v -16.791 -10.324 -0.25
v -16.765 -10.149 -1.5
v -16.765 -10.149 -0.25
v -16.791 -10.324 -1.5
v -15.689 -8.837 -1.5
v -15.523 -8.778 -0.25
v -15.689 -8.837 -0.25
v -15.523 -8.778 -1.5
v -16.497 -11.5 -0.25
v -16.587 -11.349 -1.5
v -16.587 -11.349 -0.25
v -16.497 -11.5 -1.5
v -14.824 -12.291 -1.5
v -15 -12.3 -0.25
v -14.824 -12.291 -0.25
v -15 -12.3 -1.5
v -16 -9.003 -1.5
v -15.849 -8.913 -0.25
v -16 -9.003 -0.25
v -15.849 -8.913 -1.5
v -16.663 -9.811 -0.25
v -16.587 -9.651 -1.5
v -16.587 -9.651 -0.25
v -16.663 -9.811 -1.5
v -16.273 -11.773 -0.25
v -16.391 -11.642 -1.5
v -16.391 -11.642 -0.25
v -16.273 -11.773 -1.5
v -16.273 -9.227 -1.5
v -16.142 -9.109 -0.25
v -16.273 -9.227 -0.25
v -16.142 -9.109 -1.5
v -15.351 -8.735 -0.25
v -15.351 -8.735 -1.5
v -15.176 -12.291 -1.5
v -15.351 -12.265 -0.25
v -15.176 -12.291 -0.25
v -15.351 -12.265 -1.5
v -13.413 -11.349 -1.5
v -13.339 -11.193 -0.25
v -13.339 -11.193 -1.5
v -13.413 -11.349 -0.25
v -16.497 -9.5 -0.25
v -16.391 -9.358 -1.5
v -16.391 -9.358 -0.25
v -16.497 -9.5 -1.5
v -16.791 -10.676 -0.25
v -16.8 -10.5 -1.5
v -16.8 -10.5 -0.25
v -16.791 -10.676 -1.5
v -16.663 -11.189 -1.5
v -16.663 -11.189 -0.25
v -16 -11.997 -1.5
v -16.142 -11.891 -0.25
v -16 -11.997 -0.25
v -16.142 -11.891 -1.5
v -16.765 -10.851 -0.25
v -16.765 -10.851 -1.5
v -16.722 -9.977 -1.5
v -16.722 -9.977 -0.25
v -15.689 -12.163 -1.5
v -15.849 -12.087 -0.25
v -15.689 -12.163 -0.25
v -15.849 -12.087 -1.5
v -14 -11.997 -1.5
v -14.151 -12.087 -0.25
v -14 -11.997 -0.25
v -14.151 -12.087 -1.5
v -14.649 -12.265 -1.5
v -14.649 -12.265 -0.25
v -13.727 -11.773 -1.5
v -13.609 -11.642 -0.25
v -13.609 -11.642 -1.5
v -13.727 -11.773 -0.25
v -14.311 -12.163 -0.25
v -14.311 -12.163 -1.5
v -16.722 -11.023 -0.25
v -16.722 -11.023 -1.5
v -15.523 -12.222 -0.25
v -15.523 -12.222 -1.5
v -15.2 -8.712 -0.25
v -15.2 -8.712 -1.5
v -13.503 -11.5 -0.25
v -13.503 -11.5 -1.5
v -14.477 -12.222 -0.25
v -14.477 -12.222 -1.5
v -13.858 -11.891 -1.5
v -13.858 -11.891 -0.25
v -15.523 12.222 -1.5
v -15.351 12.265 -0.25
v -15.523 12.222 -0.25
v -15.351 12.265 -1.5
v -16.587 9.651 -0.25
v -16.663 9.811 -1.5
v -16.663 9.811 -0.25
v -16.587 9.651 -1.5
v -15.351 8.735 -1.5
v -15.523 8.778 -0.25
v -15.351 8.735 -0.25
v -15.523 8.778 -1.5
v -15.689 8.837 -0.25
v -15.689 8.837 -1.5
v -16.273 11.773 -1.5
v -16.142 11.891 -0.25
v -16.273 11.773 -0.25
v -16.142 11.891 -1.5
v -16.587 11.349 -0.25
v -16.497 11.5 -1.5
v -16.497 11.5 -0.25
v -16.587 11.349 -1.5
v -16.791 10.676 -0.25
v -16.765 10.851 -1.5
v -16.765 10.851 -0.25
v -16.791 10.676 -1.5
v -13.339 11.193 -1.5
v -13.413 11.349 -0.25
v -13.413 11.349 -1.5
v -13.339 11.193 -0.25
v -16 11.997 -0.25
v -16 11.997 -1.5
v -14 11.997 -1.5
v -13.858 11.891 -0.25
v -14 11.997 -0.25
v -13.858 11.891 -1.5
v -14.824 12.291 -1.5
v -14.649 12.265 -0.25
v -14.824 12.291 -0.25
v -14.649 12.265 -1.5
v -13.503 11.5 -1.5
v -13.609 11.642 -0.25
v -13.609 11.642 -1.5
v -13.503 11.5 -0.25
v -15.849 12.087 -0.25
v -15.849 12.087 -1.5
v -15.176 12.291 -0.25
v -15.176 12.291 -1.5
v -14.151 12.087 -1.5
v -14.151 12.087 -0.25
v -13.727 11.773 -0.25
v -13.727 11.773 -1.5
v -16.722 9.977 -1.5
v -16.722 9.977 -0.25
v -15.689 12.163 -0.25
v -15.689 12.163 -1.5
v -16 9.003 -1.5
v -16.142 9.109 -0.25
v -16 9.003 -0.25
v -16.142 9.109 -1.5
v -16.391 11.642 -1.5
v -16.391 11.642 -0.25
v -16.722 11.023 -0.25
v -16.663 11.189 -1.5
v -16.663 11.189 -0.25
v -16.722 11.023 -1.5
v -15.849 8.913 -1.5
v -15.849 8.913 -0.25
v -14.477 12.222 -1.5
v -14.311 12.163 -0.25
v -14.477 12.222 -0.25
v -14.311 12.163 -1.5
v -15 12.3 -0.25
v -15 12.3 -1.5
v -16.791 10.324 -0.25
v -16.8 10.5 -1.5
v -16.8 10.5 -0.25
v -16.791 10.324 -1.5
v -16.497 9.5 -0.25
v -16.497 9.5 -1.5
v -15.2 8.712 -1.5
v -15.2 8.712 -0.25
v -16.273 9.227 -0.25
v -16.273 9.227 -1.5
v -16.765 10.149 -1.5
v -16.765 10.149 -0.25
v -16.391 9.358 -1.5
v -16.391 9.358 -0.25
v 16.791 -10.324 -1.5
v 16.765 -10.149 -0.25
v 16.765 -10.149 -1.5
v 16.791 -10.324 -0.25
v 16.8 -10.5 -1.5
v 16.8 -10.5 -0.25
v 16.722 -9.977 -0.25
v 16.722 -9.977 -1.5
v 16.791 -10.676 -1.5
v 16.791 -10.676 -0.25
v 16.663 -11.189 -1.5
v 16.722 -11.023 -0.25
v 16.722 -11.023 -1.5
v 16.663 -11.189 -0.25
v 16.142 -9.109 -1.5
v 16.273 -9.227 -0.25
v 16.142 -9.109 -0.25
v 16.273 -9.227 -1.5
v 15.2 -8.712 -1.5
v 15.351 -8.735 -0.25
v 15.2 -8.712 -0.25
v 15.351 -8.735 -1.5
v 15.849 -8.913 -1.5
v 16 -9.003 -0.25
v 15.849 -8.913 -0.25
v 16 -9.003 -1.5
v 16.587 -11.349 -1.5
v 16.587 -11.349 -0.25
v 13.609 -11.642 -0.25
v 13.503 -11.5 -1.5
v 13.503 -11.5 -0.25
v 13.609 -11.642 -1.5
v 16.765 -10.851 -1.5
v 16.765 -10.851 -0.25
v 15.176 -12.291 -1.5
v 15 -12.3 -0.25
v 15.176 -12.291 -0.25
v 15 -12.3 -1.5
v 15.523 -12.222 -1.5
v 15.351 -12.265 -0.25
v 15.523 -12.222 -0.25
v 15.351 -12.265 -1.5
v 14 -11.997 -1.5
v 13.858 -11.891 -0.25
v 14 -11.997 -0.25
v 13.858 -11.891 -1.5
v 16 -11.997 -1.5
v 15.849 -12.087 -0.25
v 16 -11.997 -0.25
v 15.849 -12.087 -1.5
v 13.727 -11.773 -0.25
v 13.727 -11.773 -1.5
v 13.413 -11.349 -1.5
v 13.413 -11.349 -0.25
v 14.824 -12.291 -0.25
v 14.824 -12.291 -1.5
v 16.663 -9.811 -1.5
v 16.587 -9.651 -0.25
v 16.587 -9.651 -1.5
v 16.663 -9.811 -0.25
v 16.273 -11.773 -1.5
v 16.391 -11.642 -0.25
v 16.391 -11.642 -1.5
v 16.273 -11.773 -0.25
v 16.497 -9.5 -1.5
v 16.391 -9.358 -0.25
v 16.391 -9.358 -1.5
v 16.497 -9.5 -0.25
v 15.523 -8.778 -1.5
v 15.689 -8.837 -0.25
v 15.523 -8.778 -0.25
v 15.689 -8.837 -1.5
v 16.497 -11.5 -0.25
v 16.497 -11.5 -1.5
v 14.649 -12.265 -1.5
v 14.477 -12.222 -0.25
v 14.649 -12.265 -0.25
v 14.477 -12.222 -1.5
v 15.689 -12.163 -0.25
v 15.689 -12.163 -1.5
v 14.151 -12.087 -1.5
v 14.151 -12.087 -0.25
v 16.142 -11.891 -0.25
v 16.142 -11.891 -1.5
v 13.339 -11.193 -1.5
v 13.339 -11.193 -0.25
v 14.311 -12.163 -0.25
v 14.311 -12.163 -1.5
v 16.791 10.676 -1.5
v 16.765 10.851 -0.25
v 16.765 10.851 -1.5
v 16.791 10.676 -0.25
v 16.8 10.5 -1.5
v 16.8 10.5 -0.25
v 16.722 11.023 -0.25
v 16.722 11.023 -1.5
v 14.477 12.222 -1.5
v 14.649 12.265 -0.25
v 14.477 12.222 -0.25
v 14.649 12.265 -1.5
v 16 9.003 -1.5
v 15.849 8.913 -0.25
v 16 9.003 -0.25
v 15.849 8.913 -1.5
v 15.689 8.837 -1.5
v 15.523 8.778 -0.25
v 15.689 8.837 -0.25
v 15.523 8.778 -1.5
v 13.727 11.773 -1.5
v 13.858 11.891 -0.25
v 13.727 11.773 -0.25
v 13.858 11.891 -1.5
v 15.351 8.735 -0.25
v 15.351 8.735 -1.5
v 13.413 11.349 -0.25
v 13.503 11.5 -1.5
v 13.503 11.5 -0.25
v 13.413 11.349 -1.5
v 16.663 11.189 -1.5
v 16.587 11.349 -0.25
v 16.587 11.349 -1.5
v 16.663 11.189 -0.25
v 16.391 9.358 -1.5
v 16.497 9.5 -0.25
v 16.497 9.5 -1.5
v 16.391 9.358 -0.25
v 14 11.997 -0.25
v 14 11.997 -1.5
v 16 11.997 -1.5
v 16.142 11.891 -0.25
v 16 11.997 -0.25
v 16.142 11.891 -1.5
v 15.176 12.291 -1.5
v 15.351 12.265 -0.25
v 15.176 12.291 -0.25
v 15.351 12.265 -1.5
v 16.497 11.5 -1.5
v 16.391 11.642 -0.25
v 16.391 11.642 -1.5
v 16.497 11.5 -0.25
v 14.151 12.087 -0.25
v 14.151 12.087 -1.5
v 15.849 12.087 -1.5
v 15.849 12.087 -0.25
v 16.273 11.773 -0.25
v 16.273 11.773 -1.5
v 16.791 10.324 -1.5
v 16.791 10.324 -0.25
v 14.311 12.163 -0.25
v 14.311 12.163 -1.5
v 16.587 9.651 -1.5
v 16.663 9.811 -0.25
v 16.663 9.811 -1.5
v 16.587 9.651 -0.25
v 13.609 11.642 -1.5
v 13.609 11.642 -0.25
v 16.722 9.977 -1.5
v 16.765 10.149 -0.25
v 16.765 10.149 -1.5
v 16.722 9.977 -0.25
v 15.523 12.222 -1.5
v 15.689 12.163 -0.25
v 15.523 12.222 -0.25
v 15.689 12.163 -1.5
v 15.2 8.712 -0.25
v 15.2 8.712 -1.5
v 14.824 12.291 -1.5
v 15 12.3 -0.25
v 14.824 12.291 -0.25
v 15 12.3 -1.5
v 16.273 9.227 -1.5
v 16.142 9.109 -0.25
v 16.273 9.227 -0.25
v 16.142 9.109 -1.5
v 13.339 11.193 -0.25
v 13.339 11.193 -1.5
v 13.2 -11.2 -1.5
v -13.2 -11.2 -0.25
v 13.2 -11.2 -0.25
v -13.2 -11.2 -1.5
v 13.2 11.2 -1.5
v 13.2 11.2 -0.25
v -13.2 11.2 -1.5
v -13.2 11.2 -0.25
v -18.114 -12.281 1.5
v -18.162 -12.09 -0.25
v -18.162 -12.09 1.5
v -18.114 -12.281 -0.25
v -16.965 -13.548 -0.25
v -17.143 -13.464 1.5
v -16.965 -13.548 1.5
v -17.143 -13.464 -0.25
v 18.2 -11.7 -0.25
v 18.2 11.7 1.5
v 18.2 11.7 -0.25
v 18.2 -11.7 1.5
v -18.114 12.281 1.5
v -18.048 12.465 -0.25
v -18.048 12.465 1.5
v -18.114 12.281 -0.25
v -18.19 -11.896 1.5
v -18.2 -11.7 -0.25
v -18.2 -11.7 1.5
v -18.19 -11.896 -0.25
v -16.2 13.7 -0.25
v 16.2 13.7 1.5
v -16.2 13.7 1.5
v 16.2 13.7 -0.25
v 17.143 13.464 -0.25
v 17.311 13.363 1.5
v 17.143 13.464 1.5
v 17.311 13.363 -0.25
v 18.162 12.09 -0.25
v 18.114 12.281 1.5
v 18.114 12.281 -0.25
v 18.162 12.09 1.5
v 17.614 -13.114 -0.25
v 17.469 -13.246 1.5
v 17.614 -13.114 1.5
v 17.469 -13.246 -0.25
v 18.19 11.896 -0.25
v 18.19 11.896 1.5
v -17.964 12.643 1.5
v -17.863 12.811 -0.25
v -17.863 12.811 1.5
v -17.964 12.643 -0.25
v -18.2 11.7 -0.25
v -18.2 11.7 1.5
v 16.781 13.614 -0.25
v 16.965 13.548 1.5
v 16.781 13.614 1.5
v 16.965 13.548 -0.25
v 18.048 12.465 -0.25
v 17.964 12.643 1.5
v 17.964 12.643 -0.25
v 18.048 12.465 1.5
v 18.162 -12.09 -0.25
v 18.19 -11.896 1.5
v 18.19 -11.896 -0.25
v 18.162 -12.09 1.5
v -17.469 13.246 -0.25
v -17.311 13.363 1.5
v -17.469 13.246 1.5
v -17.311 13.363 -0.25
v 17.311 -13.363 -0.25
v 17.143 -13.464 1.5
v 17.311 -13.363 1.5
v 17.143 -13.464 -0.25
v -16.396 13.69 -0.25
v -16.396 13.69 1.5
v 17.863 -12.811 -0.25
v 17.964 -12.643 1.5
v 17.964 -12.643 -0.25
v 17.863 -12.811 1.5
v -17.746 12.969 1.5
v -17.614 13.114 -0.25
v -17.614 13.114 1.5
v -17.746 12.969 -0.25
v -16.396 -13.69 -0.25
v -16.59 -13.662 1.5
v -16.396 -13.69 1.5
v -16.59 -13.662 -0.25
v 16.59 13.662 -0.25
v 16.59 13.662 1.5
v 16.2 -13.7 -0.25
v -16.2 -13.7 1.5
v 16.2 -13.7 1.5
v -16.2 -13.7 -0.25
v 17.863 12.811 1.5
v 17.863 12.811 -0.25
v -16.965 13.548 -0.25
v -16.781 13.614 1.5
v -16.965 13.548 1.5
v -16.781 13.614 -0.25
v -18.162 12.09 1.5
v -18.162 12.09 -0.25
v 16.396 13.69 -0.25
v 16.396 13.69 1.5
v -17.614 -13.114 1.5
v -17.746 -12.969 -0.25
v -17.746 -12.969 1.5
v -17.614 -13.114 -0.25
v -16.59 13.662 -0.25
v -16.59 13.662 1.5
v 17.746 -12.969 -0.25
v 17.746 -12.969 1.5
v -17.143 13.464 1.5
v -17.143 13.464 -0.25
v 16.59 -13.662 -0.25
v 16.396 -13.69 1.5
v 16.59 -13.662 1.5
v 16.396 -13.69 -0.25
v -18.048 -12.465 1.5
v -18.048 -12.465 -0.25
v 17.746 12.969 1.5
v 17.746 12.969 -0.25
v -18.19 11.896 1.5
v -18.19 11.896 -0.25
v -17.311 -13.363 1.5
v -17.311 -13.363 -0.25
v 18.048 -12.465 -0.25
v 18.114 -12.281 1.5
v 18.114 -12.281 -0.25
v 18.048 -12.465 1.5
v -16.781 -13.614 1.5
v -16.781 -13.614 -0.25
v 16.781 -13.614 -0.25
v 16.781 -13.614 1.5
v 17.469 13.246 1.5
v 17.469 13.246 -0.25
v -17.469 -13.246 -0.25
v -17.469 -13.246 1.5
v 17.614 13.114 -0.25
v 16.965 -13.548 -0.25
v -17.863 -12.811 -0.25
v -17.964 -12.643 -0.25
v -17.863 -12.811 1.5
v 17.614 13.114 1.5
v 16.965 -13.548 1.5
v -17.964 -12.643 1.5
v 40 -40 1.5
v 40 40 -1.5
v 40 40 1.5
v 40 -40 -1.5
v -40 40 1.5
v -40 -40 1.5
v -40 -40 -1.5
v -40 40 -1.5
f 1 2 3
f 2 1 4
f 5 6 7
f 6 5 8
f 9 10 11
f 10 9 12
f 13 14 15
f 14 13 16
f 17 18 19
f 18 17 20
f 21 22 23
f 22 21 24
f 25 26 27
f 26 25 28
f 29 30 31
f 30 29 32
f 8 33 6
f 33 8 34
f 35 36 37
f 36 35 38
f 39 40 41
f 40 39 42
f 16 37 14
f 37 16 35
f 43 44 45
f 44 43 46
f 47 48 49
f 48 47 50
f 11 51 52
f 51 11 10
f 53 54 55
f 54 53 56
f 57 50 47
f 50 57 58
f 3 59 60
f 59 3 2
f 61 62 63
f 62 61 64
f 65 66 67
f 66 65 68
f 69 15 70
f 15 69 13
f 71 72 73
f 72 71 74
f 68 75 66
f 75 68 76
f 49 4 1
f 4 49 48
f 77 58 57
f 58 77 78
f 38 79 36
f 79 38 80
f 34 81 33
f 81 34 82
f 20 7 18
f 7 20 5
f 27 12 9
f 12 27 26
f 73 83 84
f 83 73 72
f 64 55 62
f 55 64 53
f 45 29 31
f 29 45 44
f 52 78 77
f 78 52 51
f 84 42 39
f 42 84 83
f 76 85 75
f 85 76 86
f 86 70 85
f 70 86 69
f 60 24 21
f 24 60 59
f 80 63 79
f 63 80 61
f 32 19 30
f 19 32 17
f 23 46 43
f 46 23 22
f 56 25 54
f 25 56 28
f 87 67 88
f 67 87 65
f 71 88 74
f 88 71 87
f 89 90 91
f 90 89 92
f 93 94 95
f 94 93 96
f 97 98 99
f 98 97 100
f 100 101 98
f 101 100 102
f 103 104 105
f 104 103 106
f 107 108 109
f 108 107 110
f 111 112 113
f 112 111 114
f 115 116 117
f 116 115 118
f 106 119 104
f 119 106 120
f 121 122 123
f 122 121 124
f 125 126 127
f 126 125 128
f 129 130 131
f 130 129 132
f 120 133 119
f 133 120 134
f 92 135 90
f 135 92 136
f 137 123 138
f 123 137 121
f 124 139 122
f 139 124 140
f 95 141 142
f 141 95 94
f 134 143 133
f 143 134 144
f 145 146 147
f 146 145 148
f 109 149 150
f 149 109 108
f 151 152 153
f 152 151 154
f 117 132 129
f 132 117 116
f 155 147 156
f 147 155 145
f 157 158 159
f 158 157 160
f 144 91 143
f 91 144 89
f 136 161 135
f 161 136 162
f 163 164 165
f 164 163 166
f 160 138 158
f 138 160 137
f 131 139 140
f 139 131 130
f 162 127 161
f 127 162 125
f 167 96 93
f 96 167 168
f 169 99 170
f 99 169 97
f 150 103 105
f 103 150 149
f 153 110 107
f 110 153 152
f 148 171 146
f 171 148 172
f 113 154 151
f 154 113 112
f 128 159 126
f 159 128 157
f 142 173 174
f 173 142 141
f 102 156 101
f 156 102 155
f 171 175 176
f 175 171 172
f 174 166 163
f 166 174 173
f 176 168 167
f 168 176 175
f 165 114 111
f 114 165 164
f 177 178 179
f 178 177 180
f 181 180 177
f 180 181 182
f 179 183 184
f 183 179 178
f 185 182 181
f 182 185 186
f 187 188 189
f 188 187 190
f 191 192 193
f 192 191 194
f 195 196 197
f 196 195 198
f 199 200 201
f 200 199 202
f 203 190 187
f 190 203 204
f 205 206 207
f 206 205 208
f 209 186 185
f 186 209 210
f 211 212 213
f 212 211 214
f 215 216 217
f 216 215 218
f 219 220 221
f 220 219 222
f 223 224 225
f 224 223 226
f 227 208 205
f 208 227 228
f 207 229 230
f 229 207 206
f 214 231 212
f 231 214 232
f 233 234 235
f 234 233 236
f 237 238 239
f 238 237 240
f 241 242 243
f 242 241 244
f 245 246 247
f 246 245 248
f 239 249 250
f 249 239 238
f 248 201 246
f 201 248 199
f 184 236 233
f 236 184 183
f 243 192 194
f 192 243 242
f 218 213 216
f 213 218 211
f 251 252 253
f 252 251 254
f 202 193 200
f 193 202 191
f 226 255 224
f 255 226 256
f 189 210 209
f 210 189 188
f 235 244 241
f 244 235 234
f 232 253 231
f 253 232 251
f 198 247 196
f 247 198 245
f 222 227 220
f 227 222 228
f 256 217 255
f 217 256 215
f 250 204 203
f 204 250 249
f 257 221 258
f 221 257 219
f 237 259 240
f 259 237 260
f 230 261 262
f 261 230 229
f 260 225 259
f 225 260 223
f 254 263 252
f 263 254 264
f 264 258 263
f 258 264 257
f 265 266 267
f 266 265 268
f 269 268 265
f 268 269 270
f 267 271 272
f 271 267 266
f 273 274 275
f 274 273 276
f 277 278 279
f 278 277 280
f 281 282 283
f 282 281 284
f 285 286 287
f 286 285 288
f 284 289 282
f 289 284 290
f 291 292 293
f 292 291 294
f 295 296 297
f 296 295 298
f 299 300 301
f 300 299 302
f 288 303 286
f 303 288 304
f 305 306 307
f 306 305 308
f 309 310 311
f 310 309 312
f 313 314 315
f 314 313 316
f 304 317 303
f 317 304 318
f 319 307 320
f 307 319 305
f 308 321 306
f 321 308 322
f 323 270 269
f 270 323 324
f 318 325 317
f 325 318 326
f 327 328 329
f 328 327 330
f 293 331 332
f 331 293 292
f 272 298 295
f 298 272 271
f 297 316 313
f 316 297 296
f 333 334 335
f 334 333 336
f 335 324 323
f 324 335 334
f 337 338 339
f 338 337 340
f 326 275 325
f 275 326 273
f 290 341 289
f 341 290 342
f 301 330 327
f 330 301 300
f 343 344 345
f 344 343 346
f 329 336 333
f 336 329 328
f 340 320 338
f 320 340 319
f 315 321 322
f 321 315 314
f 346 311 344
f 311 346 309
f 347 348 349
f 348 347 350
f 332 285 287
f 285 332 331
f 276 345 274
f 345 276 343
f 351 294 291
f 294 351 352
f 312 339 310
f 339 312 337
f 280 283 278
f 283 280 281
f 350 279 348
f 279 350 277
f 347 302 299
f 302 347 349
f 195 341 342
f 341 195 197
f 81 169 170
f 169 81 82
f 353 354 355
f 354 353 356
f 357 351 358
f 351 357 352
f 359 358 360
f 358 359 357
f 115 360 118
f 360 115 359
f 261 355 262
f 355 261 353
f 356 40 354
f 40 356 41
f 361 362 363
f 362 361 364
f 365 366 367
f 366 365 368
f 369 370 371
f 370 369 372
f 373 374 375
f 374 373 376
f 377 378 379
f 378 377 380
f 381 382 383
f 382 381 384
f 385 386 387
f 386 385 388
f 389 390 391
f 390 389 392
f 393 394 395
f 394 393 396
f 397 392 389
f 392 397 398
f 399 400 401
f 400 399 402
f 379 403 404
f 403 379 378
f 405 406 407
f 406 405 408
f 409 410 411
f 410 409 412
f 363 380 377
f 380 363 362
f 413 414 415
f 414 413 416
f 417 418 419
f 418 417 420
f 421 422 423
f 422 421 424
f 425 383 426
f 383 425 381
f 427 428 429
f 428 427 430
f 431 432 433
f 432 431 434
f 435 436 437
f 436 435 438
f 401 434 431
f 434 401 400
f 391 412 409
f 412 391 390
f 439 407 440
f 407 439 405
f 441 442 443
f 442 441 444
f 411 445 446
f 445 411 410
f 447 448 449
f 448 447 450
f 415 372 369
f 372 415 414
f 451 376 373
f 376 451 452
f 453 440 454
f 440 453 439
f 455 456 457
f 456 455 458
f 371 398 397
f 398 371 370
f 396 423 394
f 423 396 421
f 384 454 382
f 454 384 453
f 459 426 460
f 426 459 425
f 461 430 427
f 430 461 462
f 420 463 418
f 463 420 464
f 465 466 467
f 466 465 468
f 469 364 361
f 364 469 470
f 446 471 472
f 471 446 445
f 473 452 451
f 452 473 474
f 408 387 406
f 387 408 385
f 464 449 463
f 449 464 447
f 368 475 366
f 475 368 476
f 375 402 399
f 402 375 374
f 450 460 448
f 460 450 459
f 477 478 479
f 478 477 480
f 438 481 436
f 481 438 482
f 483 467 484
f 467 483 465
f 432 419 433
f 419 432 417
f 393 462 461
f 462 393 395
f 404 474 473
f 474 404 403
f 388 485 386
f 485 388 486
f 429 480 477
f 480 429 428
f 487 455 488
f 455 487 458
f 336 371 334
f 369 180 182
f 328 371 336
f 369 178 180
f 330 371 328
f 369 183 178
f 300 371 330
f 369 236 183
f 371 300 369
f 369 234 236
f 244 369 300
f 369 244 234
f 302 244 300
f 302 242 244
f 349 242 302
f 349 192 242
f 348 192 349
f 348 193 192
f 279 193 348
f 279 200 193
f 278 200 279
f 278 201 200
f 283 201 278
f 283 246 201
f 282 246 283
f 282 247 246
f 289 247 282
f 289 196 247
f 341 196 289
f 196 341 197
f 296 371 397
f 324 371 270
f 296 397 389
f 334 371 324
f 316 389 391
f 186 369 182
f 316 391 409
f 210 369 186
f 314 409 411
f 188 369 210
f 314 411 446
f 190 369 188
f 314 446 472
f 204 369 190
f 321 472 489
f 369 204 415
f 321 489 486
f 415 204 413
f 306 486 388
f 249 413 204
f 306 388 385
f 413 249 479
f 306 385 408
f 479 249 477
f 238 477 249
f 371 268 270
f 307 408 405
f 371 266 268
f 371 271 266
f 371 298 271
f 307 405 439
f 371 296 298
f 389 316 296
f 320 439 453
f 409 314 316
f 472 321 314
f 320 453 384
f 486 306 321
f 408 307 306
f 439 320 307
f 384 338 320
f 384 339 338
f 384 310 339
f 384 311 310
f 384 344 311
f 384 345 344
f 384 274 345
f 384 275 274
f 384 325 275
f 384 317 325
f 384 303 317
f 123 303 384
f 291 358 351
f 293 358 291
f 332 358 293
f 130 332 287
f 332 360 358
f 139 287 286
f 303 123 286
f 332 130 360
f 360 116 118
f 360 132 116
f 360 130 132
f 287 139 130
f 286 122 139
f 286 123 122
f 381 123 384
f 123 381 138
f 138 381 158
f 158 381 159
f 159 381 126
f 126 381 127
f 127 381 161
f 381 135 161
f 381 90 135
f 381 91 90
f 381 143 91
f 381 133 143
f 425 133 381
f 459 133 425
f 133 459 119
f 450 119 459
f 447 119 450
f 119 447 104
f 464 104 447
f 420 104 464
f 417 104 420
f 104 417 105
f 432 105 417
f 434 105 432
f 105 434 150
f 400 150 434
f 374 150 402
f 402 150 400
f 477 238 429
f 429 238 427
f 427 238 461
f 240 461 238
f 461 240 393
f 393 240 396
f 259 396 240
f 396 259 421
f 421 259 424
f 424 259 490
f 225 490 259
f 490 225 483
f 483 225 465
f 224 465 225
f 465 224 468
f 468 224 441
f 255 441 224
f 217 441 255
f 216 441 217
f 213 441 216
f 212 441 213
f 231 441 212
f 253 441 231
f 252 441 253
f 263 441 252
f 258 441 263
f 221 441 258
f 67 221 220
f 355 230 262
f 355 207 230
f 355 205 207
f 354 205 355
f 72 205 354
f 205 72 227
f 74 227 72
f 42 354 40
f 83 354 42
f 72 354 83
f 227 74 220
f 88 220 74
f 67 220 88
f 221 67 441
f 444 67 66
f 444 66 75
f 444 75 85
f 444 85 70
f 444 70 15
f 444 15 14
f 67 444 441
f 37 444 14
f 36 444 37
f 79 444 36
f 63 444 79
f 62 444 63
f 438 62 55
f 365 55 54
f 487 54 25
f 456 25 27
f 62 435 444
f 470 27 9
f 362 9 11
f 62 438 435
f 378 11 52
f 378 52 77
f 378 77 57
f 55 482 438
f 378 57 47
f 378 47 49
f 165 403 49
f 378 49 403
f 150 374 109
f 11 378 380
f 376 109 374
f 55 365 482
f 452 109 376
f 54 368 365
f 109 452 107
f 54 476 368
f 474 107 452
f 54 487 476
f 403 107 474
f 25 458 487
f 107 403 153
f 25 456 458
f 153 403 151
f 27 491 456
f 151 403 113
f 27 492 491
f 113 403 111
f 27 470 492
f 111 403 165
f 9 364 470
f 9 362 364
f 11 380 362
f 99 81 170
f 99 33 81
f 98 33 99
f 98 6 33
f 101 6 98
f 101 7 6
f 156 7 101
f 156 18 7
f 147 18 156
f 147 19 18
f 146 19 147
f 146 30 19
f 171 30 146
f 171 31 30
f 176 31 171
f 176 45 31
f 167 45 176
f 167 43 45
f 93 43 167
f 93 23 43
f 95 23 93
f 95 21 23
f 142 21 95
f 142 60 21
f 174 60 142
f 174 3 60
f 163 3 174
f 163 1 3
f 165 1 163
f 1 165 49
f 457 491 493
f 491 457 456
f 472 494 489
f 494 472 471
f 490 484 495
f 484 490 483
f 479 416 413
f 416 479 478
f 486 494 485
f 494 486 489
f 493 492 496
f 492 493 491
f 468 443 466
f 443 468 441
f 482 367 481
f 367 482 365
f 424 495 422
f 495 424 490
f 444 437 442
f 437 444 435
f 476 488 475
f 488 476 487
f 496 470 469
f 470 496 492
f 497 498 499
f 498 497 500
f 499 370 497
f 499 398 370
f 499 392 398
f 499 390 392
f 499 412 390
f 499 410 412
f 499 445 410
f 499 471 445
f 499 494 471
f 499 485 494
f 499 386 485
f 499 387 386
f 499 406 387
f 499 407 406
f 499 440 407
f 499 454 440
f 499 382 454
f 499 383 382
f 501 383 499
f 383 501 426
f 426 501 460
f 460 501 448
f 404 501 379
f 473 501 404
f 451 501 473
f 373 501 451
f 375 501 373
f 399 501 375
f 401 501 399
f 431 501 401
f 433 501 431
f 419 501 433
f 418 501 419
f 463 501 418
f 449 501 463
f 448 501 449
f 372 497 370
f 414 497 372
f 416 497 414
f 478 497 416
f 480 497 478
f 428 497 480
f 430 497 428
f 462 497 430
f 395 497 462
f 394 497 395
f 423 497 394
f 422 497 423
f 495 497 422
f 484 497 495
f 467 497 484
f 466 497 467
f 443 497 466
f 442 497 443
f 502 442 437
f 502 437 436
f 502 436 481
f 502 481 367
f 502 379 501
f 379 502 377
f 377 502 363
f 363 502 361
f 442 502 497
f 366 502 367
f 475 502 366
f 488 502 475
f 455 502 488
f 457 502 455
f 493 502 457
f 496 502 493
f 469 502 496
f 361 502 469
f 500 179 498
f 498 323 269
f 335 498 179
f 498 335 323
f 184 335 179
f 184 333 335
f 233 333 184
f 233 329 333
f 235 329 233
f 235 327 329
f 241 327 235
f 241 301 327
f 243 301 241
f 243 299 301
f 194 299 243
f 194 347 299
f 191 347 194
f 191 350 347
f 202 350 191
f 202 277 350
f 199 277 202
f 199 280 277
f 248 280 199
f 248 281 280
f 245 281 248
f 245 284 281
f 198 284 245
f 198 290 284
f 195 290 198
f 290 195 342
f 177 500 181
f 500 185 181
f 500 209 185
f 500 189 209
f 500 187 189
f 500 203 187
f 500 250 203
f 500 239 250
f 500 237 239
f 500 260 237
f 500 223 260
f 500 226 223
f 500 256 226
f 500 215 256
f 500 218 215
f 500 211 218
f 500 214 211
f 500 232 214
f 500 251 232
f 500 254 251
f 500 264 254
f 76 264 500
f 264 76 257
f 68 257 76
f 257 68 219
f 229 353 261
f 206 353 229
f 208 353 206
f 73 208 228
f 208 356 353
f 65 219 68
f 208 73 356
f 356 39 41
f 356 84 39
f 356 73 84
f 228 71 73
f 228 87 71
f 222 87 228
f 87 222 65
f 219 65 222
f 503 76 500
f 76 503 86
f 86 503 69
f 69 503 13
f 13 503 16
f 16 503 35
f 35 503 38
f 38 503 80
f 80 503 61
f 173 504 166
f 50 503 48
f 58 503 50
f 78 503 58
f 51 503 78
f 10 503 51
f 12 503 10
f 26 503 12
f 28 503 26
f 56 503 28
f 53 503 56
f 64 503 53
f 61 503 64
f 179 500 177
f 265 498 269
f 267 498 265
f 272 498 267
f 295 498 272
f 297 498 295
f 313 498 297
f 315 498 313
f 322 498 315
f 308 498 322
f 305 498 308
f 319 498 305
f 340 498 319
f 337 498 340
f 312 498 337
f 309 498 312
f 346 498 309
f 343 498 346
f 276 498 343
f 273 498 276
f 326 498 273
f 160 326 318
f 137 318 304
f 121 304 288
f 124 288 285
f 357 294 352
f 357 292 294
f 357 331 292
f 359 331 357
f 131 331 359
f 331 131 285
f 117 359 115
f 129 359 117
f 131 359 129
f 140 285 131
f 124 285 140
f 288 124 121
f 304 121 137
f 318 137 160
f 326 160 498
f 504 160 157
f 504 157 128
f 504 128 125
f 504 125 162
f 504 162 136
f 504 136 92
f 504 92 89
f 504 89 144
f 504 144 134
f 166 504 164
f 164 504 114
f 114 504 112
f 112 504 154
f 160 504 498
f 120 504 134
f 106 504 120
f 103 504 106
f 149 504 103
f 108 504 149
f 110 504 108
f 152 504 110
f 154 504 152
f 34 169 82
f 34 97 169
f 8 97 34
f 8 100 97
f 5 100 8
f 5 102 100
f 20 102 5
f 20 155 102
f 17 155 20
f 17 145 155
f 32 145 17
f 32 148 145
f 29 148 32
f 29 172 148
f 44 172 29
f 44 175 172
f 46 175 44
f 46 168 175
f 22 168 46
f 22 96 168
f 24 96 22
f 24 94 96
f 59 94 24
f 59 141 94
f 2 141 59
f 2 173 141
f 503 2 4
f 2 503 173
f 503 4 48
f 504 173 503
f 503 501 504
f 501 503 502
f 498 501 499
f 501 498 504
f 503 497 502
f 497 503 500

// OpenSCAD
$fn=64;

module rounded_rect_2d(w, h, r){
    r2 = min(r, min(w,h)/2);
    hull(){
        translate([ w/2 - r2,  h/2 - r2]) circle(r=r2);
        translate([-w/2 + r2,  h/2 - r2]) circle(r=r2);
        translate([-w/2 + r2, -h/2 + r2]) circle(r=r2);
        translate([ w/2 - r2, -h/2 + r2]) circle(r=r2);
    }
}

module slot_2d(w, h){
    hull(){
        translate([ w/2 - h/2, 0]) circle(r=h/2);
        translate([-w/2 + h/2, 0]) circle(r=h/2);
    }
}

module iec_fused_inlet_old_cutout(
    face_w=36.0,
    face_h=27.0,
    face_th=3.0,
    body_w=30.0,
    body_h=22.0,
    body_depth=28.0,
    corner_r=2.0,
    clearance=0.2,
    flange_overhang=1.0,
    screw_d=3.2,
    screw_x=30.0,
    screw_y=21.0
){
    union(){
        // Main body cutout through panel
        translate([0,0,-(body_depth/2)])
            linear_extrude(height=body_depth, center=true)
                rounded_rect_2d(body_w + 2*clearance, body_h + 2*clearance, corner_r);

        // Front flange relief (shallow)
        translate([0,0,face_th/2])
            linear_extrude(height=face_th + 0.5, center=true)
                rounded_rect_2d(face_w + 2*clearance, face_h + 2*clearance, corner_r);

        // Screw holes (typical panel mount)
        for (sx=[-1,1], sy=[-1,1]){
            translate([sx*screw_x/2, sy*screw_y/2, 0])
                cylinder(d=screw_d + 2*clearance, h=body_depth + face_th + 10, center=true);
        }
    }
}

module panel(size=80, th=3){
    translate([0,0,0])
        cube([size,size,th], center=true);
}

difference(){
    panel(80, 3);
    translate([0,0,0])
        iec_fused_inlet_old_cutout();
}
